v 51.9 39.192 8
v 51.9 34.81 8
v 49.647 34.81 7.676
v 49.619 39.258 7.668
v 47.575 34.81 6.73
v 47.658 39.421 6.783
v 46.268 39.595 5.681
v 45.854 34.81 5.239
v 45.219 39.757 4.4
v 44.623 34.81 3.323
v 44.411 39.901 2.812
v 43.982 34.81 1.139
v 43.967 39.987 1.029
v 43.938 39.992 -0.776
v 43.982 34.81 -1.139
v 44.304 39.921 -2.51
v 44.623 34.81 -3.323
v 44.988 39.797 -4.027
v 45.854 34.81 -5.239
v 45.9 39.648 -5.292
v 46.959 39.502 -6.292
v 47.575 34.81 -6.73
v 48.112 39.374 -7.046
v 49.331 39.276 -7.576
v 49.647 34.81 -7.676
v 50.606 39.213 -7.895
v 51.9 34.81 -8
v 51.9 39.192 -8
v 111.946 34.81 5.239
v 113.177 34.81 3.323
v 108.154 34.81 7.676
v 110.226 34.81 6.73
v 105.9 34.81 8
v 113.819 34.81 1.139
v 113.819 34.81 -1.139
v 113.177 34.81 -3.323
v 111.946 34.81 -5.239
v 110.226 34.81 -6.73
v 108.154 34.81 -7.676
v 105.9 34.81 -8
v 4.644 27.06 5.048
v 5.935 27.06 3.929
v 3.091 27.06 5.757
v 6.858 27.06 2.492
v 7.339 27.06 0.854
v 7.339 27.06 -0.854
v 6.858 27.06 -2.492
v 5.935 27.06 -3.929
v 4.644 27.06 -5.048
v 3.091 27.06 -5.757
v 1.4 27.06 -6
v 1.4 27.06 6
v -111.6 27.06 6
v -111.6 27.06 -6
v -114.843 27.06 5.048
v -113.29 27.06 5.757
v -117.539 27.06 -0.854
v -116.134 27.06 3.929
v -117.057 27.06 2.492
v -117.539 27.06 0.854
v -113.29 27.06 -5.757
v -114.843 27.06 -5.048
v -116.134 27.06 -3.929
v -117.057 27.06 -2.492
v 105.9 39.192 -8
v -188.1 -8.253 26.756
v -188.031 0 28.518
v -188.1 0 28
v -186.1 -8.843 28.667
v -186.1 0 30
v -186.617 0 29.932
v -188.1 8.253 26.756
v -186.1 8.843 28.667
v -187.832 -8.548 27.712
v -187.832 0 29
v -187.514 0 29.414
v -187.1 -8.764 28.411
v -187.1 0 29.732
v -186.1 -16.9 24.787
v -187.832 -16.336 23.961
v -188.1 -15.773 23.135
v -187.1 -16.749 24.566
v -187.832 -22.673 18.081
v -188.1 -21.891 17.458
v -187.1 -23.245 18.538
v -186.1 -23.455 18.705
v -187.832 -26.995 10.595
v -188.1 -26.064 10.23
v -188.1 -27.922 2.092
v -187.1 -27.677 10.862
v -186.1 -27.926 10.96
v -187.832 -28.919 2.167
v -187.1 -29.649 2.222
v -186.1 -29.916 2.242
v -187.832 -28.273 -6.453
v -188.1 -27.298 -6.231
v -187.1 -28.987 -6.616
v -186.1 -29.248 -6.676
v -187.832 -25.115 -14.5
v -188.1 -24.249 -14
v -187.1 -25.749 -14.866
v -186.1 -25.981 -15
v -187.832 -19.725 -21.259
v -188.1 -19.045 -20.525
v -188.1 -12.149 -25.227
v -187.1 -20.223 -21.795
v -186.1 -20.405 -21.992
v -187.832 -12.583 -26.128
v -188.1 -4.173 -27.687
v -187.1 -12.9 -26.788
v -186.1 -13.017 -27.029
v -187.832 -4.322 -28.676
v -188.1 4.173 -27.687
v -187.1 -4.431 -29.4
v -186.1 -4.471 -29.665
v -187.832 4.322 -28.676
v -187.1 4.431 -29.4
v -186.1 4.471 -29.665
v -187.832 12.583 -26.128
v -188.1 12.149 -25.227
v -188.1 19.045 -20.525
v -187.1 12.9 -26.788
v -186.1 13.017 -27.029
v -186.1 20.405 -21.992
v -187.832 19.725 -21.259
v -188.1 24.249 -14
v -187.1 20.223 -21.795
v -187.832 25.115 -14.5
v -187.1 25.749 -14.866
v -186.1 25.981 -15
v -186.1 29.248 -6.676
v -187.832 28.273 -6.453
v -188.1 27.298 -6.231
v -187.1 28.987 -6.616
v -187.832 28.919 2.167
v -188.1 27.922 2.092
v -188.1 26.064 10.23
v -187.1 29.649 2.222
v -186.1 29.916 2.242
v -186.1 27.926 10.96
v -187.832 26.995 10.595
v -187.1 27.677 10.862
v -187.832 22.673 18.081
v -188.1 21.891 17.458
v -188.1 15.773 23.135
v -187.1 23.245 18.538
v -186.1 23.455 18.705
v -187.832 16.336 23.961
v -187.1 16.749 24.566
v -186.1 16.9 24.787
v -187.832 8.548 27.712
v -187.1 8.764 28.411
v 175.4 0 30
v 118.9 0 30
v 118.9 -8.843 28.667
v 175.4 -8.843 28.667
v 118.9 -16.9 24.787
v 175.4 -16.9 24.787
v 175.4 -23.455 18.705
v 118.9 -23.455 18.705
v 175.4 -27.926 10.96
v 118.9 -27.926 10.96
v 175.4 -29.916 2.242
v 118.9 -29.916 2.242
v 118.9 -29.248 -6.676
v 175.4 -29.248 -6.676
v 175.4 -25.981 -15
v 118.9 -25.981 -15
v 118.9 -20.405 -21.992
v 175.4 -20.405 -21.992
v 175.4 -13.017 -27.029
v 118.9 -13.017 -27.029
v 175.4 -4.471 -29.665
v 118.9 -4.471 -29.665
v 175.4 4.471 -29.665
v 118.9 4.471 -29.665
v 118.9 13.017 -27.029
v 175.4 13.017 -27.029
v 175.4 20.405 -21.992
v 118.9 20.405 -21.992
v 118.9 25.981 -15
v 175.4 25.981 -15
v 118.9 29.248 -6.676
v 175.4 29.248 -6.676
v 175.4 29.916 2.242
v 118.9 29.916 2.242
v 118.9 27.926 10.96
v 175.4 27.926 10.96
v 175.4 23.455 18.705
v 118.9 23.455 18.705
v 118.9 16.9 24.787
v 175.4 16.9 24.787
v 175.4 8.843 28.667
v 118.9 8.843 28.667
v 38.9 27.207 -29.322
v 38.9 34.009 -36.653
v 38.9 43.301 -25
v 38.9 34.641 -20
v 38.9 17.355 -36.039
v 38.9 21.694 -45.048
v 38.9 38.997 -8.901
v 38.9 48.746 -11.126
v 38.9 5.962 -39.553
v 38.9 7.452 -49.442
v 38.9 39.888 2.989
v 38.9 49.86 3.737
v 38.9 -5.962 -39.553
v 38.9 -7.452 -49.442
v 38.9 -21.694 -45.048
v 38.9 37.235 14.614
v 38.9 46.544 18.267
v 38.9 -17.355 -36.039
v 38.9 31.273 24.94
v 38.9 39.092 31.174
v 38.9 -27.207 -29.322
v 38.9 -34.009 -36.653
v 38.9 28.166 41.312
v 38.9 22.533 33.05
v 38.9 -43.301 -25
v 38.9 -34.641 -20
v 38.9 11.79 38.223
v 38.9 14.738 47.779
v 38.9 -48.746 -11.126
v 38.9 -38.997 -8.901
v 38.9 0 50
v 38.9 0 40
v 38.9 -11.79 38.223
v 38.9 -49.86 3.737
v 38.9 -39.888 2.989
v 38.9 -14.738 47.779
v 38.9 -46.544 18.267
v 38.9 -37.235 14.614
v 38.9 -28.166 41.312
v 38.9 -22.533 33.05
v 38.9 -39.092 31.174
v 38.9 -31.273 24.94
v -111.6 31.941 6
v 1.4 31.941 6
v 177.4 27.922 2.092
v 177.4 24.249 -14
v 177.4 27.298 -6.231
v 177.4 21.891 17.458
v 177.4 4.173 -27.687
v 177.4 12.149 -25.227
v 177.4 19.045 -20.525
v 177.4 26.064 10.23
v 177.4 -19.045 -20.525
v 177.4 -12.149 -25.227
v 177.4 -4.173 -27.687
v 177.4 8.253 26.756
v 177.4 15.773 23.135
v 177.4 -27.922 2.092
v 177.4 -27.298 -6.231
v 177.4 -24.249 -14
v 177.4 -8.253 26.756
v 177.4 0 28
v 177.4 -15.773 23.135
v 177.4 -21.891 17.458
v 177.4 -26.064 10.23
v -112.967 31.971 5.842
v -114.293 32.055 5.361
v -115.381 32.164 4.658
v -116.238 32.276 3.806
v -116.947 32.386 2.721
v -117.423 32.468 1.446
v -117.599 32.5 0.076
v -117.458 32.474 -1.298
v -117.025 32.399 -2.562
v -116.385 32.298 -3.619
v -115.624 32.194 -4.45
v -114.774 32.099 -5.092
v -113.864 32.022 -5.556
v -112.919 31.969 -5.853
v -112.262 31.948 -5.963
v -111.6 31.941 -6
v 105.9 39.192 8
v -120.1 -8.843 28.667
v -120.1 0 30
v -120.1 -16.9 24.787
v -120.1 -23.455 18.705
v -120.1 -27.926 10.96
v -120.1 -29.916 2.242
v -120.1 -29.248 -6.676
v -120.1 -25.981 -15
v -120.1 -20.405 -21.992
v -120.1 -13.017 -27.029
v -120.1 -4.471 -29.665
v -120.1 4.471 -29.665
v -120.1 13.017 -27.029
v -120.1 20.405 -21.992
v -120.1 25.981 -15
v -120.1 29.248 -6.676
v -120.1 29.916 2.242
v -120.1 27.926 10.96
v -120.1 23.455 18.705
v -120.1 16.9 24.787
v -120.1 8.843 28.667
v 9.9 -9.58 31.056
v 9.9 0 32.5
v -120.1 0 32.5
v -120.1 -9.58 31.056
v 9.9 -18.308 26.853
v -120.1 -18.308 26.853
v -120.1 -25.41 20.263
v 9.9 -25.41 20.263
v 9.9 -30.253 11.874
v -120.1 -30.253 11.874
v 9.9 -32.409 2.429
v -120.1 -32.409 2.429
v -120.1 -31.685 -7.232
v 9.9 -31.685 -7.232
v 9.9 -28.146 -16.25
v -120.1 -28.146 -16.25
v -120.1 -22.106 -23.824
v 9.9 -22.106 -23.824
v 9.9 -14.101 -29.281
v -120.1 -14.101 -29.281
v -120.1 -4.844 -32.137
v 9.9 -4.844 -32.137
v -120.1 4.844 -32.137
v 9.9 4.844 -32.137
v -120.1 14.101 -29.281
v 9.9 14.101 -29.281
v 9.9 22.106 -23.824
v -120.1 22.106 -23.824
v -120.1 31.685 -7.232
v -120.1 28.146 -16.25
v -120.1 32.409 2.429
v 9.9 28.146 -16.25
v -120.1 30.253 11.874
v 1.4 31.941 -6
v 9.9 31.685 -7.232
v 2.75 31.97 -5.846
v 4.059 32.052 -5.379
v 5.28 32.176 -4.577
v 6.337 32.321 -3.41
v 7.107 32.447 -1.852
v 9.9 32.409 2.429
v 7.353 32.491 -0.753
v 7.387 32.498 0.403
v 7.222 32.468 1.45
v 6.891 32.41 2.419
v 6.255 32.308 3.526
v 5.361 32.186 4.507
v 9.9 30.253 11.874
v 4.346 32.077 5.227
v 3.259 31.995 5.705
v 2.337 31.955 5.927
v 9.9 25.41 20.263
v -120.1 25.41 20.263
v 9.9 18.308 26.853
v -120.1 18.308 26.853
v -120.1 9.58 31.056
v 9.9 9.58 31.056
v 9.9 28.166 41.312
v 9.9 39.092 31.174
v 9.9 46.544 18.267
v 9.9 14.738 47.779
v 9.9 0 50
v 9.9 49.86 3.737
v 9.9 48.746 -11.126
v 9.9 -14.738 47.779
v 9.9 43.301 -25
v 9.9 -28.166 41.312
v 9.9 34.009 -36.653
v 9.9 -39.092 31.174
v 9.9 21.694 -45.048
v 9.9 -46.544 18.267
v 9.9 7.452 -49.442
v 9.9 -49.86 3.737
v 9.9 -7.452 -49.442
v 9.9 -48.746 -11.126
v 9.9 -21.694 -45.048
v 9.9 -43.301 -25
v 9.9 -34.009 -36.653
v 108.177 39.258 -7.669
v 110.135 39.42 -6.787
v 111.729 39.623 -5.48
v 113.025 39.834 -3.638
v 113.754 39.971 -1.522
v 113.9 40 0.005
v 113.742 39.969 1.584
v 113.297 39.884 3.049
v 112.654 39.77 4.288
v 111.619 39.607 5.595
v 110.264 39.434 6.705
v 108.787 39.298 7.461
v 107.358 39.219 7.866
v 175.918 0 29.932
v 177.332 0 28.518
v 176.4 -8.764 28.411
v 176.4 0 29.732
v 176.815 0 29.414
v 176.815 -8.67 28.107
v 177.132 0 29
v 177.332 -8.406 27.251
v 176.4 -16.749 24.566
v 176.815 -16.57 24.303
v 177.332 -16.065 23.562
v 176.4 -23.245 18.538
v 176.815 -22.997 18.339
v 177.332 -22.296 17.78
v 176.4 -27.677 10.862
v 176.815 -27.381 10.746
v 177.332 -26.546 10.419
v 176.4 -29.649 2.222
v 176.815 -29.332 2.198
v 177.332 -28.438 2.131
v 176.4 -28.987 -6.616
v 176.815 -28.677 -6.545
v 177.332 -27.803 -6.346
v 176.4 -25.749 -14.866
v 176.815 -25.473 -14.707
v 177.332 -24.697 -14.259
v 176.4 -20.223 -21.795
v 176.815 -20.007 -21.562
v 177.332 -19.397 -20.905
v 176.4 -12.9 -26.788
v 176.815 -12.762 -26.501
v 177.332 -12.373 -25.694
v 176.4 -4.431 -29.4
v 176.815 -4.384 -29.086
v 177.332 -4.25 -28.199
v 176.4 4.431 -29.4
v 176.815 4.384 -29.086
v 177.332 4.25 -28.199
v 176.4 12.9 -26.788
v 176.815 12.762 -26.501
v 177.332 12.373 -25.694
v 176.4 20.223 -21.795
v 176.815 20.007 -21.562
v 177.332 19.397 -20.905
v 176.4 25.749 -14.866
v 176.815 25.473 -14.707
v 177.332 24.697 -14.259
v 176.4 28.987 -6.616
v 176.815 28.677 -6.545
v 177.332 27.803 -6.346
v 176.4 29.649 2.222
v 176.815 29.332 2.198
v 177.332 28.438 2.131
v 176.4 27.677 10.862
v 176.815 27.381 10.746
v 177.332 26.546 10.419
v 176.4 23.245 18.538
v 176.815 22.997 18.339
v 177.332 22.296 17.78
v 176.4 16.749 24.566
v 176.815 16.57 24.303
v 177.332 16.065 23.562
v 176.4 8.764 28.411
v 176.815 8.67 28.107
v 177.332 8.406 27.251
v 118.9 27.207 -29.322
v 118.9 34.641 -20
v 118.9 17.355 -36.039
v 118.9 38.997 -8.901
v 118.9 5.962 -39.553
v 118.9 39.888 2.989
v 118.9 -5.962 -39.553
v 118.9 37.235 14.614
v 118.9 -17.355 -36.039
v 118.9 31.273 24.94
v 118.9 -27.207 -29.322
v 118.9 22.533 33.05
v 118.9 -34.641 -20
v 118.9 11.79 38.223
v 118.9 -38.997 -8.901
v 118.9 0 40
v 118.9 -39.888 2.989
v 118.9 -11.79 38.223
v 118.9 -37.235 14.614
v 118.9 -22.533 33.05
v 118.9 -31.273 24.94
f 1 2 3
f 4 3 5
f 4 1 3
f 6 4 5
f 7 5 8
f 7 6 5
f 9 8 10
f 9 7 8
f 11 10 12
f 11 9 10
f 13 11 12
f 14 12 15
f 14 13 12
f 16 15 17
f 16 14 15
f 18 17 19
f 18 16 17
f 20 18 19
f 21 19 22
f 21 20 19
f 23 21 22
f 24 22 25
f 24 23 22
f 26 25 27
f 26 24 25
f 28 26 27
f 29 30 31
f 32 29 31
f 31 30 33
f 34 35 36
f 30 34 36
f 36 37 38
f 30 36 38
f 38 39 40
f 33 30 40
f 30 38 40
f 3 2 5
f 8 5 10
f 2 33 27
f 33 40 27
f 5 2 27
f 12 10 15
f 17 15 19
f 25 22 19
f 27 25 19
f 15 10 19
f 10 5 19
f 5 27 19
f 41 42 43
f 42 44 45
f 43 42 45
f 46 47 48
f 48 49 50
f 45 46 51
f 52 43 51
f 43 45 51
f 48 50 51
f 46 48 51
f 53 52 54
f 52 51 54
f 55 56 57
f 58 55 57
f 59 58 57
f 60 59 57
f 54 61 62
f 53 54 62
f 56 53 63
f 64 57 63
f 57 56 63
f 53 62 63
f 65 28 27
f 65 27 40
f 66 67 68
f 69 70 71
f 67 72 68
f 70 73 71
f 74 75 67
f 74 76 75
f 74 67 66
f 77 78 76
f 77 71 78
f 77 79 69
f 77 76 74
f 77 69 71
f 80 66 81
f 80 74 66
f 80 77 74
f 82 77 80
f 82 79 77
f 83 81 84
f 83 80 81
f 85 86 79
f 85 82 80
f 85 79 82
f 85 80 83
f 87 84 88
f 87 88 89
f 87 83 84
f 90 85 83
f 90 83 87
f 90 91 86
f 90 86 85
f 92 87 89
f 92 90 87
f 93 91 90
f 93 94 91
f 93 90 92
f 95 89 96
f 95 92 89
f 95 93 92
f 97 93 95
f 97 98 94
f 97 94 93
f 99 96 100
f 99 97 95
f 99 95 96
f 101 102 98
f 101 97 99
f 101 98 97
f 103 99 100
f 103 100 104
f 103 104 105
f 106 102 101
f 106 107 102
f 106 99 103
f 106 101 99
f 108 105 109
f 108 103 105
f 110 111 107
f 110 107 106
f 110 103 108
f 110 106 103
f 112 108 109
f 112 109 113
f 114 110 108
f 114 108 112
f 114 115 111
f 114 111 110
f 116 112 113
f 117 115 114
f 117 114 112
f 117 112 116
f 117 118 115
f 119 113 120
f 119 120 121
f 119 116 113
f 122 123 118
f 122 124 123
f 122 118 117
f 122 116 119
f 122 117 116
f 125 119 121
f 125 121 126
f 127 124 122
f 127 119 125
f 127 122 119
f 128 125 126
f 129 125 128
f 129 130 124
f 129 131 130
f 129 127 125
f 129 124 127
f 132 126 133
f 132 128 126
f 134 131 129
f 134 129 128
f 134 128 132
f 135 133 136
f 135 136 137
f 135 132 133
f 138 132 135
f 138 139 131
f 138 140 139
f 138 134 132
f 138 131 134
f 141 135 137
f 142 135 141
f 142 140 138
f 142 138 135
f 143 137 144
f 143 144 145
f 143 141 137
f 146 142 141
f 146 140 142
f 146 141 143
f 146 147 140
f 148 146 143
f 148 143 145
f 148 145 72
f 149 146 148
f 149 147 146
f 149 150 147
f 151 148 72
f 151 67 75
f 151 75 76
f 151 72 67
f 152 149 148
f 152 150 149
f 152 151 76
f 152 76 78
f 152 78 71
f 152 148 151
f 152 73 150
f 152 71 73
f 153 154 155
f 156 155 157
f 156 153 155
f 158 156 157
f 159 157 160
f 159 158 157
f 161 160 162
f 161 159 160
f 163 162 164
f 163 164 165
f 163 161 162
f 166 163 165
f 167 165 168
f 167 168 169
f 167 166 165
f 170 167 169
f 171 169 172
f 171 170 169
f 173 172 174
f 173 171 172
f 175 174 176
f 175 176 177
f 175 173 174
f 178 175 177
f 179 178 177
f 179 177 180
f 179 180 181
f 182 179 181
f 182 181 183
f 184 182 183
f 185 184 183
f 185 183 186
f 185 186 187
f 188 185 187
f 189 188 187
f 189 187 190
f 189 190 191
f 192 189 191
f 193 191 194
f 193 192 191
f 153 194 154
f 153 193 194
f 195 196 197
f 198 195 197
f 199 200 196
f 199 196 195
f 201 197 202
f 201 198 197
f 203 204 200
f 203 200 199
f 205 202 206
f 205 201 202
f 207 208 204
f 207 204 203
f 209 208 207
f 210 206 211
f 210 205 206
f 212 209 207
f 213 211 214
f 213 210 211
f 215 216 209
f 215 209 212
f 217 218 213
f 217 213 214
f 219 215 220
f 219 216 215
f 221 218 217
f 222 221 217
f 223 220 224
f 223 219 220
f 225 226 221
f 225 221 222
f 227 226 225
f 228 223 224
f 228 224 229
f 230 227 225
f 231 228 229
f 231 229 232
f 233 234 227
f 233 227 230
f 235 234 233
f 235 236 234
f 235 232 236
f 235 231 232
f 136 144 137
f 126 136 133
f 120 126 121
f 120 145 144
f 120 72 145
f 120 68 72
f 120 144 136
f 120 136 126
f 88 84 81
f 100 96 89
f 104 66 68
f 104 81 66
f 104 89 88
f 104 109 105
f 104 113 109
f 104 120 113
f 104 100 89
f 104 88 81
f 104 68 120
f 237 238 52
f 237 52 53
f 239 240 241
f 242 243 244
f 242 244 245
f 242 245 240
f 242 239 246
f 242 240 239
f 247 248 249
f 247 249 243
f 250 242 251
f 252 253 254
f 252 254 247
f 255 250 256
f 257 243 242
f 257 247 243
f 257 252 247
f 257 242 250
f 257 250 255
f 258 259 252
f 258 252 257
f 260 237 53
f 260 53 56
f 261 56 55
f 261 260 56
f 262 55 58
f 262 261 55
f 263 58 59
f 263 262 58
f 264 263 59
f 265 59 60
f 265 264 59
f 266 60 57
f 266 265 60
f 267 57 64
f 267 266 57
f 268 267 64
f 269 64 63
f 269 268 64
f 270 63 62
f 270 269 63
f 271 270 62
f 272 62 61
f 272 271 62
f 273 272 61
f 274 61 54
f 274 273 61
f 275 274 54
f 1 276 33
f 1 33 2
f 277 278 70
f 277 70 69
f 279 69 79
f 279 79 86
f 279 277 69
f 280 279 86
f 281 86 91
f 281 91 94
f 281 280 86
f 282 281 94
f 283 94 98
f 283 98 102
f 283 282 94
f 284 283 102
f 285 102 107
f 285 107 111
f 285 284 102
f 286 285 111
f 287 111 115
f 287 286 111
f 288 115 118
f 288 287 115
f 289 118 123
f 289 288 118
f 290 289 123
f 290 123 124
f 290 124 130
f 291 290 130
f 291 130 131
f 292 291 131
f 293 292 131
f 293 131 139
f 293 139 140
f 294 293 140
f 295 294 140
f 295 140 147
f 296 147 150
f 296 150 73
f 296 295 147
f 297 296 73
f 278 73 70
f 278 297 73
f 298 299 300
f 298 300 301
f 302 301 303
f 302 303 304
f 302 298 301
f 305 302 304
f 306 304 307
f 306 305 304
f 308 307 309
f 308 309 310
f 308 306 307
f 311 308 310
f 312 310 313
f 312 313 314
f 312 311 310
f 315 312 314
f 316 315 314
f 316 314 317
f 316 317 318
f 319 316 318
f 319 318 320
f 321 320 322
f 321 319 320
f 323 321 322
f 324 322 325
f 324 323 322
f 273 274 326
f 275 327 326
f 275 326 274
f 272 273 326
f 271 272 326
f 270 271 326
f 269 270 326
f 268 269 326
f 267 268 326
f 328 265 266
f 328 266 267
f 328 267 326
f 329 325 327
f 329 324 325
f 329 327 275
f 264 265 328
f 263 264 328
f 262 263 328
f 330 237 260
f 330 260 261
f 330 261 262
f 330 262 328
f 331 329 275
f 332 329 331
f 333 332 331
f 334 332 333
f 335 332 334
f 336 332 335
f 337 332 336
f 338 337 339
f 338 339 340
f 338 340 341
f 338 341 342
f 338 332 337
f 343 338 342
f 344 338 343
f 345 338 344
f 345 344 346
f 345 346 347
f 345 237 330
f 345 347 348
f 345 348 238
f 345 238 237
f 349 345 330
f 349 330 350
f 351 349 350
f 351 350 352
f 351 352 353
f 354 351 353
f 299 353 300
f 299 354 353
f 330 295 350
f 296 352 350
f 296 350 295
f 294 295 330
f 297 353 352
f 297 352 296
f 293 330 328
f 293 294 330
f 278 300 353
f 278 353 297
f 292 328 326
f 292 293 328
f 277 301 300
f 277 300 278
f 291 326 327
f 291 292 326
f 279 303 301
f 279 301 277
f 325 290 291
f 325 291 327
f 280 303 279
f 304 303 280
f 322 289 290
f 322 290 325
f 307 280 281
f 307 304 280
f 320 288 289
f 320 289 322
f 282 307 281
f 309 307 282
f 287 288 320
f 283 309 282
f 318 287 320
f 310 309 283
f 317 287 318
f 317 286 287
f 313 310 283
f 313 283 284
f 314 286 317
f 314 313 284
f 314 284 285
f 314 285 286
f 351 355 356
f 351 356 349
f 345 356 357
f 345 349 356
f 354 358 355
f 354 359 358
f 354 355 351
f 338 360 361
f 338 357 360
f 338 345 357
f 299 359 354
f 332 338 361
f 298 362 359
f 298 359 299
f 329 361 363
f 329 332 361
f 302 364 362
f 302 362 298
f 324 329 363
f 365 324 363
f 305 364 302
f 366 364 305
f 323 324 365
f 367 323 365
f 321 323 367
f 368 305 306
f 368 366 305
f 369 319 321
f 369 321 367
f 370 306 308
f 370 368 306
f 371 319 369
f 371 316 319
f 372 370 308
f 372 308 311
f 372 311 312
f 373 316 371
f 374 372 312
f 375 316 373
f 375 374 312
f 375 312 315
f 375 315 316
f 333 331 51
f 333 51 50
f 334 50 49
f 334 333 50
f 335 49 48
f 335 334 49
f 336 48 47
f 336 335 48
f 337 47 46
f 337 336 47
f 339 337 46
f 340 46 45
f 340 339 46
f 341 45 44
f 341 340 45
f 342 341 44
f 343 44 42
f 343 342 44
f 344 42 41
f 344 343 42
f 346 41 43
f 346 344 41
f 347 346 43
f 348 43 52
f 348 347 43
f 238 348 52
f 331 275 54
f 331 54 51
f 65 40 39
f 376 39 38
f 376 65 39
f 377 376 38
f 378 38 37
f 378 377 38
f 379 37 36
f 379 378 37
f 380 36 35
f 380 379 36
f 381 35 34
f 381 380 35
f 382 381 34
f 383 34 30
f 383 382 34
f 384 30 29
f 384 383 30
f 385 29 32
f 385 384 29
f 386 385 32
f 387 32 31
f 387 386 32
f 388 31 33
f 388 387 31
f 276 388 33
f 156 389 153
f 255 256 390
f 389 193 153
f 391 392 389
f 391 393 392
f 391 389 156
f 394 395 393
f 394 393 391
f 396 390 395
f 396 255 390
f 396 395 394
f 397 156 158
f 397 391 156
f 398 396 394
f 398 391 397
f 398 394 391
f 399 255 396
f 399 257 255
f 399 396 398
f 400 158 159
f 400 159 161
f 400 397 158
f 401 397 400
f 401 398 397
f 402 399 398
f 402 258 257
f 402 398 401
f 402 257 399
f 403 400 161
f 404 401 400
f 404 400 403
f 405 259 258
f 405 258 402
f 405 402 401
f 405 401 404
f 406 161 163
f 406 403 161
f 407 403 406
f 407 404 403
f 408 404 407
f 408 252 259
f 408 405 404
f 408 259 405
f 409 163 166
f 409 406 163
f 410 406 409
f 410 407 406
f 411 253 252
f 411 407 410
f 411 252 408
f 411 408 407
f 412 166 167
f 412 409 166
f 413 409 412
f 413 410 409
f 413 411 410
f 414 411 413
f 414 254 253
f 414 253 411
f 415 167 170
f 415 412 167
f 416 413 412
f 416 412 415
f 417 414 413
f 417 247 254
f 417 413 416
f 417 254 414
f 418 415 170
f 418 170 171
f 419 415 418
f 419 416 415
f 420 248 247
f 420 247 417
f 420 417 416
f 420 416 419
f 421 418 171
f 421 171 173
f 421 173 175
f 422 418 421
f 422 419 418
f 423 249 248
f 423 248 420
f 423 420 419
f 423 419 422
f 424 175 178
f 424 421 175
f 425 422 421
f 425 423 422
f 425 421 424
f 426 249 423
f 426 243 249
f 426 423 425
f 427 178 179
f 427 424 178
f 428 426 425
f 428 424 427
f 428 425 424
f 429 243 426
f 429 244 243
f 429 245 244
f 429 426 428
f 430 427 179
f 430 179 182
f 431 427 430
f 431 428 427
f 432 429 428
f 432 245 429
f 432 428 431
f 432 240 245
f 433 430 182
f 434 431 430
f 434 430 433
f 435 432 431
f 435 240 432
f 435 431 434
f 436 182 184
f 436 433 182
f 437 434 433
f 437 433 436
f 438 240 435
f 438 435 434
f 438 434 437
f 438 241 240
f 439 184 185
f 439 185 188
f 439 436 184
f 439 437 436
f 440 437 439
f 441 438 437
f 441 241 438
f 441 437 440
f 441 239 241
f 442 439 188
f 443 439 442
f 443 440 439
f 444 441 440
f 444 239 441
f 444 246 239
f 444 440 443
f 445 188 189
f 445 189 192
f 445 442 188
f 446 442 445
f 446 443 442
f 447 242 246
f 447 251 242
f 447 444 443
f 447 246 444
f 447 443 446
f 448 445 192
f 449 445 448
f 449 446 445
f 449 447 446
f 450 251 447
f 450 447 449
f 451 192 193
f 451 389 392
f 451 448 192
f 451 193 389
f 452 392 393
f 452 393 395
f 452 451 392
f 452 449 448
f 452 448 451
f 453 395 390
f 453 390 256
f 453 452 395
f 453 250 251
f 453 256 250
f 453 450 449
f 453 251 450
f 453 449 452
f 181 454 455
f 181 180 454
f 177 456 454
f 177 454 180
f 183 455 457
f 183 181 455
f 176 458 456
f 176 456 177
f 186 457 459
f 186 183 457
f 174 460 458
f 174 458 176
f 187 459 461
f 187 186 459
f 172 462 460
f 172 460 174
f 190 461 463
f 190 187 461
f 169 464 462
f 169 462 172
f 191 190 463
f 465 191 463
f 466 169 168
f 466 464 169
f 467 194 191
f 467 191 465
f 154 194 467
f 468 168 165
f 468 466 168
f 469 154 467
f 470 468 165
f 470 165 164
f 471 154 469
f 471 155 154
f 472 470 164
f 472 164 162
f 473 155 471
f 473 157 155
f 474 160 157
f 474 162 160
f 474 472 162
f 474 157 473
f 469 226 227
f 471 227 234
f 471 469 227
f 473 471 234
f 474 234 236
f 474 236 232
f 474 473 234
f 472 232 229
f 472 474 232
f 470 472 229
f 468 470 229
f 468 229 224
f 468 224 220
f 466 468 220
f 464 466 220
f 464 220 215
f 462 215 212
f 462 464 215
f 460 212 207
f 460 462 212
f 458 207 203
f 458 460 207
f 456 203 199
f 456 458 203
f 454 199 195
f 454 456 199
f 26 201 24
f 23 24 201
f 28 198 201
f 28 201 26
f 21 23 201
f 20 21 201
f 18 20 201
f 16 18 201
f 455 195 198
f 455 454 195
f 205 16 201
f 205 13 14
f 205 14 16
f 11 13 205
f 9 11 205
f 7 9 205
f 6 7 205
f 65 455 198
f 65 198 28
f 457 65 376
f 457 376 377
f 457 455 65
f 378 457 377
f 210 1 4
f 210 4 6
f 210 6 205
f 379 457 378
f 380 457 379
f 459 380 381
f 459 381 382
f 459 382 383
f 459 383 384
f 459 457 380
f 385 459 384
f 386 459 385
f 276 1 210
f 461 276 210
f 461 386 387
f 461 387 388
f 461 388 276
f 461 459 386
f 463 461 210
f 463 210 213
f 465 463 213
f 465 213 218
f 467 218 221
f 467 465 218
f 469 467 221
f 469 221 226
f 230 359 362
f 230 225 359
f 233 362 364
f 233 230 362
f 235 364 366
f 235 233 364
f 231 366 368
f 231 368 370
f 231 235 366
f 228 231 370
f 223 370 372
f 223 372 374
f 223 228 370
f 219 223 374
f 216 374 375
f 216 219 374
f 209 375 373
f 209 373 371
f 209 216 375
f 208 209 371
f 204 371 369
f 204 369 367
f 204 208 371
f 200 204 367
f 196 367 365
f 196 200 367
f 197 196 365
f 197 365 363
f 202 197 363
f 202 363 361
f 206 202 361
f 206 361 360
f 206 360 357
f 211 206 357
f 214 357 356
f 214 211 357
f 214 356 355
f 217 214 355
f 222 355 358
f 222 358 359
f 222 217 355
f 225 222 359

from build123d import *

# Parameters (mm, degrees)
FILLET1_R          = 2
CUT_EXTRUDE1_DEPTH = 5.44
CUT_EXTRUDE2_DEPTH = 5.19


with BuildPart() as part:
    # Sketch1 → Revolve1 (revolve)
    with BuildSketch(Plane.XY, mode=Mode.PRIVATE) as revolve1_sk:
        Polygon((-188.099626112, 0), (-188.099626112, 30), (-120.099626112, 30), (-120.099626112, 32.5), (9.900373888, 32.5), (9.900373888, 50), (38.900373888, 50), (38.900373888, 40), (118.900373888, 40), (118.900373888, 30), (177.400373888, 30), (177.400373888, 0), align=None)
    revolve(revolve1_sk.sketch.rotate(Axis((-188.099626112, 0, 0), (1, 0, 0)), 90), axis=Axis((-188.099626112, 0, 0), (1, 0, 0)))

    # Fillet1
    fillet1_edges = [part.edges().sort_by_distance(p)[0] for p in [
        (-188.099626112, 0, -30),
        (177.400373888, 0, -30),
    ]]
    fillet(fillet1_edges, radius=FILLET1_R)

    # Sketch2 → Cut-Extrude1 (cut)
    with BuildSketch(Plane(origin=(0, 32.5, 0), x_dir=(1, 0, 0), z_dir=(0, 1, 0))):
        with BuildLine():
            Line((-111.599626112, 6), (1.400373888, 6))
            ThreePointArc((1.400373888, 6), (7.400373888, 0), (1.400373888, -6))
            Line((1.400373888, -6), (-111.599626112, -6))
            ThreePointArc((-111.599626112, -6), (-117.599626112, 0), (-111.599626112, 6))
        make_face()
    extrude(amount=-CUT_EXTRUDE1_DEPTH, mode=Mode.SUBTRACT)

    # Sketch3 → Cut-Extrude2 (cut)
    with BuildSketch(Plane(origin=(0, 40, 0), x_dir=(1, 0, 0), z_dir=(0, 1, 0))):
        with BuildLine():
            Line((51.900373888, 8), (105.900373888, 8))
            ThreePointArc((105.900373888, 8), (113.900373888, 0), (105.900373888, -8))
            Line((105.900373888, -8), (51.900373888, -8))
            ThreePointArc((51.900373888, -8), (43.900373888, 0), (51.900373888, 8))
        make_face()
    extrude(amount=-CUT_EXTRUDE2_DEPTH, mode=Mode.SUBTRACT)


solid = part.part
